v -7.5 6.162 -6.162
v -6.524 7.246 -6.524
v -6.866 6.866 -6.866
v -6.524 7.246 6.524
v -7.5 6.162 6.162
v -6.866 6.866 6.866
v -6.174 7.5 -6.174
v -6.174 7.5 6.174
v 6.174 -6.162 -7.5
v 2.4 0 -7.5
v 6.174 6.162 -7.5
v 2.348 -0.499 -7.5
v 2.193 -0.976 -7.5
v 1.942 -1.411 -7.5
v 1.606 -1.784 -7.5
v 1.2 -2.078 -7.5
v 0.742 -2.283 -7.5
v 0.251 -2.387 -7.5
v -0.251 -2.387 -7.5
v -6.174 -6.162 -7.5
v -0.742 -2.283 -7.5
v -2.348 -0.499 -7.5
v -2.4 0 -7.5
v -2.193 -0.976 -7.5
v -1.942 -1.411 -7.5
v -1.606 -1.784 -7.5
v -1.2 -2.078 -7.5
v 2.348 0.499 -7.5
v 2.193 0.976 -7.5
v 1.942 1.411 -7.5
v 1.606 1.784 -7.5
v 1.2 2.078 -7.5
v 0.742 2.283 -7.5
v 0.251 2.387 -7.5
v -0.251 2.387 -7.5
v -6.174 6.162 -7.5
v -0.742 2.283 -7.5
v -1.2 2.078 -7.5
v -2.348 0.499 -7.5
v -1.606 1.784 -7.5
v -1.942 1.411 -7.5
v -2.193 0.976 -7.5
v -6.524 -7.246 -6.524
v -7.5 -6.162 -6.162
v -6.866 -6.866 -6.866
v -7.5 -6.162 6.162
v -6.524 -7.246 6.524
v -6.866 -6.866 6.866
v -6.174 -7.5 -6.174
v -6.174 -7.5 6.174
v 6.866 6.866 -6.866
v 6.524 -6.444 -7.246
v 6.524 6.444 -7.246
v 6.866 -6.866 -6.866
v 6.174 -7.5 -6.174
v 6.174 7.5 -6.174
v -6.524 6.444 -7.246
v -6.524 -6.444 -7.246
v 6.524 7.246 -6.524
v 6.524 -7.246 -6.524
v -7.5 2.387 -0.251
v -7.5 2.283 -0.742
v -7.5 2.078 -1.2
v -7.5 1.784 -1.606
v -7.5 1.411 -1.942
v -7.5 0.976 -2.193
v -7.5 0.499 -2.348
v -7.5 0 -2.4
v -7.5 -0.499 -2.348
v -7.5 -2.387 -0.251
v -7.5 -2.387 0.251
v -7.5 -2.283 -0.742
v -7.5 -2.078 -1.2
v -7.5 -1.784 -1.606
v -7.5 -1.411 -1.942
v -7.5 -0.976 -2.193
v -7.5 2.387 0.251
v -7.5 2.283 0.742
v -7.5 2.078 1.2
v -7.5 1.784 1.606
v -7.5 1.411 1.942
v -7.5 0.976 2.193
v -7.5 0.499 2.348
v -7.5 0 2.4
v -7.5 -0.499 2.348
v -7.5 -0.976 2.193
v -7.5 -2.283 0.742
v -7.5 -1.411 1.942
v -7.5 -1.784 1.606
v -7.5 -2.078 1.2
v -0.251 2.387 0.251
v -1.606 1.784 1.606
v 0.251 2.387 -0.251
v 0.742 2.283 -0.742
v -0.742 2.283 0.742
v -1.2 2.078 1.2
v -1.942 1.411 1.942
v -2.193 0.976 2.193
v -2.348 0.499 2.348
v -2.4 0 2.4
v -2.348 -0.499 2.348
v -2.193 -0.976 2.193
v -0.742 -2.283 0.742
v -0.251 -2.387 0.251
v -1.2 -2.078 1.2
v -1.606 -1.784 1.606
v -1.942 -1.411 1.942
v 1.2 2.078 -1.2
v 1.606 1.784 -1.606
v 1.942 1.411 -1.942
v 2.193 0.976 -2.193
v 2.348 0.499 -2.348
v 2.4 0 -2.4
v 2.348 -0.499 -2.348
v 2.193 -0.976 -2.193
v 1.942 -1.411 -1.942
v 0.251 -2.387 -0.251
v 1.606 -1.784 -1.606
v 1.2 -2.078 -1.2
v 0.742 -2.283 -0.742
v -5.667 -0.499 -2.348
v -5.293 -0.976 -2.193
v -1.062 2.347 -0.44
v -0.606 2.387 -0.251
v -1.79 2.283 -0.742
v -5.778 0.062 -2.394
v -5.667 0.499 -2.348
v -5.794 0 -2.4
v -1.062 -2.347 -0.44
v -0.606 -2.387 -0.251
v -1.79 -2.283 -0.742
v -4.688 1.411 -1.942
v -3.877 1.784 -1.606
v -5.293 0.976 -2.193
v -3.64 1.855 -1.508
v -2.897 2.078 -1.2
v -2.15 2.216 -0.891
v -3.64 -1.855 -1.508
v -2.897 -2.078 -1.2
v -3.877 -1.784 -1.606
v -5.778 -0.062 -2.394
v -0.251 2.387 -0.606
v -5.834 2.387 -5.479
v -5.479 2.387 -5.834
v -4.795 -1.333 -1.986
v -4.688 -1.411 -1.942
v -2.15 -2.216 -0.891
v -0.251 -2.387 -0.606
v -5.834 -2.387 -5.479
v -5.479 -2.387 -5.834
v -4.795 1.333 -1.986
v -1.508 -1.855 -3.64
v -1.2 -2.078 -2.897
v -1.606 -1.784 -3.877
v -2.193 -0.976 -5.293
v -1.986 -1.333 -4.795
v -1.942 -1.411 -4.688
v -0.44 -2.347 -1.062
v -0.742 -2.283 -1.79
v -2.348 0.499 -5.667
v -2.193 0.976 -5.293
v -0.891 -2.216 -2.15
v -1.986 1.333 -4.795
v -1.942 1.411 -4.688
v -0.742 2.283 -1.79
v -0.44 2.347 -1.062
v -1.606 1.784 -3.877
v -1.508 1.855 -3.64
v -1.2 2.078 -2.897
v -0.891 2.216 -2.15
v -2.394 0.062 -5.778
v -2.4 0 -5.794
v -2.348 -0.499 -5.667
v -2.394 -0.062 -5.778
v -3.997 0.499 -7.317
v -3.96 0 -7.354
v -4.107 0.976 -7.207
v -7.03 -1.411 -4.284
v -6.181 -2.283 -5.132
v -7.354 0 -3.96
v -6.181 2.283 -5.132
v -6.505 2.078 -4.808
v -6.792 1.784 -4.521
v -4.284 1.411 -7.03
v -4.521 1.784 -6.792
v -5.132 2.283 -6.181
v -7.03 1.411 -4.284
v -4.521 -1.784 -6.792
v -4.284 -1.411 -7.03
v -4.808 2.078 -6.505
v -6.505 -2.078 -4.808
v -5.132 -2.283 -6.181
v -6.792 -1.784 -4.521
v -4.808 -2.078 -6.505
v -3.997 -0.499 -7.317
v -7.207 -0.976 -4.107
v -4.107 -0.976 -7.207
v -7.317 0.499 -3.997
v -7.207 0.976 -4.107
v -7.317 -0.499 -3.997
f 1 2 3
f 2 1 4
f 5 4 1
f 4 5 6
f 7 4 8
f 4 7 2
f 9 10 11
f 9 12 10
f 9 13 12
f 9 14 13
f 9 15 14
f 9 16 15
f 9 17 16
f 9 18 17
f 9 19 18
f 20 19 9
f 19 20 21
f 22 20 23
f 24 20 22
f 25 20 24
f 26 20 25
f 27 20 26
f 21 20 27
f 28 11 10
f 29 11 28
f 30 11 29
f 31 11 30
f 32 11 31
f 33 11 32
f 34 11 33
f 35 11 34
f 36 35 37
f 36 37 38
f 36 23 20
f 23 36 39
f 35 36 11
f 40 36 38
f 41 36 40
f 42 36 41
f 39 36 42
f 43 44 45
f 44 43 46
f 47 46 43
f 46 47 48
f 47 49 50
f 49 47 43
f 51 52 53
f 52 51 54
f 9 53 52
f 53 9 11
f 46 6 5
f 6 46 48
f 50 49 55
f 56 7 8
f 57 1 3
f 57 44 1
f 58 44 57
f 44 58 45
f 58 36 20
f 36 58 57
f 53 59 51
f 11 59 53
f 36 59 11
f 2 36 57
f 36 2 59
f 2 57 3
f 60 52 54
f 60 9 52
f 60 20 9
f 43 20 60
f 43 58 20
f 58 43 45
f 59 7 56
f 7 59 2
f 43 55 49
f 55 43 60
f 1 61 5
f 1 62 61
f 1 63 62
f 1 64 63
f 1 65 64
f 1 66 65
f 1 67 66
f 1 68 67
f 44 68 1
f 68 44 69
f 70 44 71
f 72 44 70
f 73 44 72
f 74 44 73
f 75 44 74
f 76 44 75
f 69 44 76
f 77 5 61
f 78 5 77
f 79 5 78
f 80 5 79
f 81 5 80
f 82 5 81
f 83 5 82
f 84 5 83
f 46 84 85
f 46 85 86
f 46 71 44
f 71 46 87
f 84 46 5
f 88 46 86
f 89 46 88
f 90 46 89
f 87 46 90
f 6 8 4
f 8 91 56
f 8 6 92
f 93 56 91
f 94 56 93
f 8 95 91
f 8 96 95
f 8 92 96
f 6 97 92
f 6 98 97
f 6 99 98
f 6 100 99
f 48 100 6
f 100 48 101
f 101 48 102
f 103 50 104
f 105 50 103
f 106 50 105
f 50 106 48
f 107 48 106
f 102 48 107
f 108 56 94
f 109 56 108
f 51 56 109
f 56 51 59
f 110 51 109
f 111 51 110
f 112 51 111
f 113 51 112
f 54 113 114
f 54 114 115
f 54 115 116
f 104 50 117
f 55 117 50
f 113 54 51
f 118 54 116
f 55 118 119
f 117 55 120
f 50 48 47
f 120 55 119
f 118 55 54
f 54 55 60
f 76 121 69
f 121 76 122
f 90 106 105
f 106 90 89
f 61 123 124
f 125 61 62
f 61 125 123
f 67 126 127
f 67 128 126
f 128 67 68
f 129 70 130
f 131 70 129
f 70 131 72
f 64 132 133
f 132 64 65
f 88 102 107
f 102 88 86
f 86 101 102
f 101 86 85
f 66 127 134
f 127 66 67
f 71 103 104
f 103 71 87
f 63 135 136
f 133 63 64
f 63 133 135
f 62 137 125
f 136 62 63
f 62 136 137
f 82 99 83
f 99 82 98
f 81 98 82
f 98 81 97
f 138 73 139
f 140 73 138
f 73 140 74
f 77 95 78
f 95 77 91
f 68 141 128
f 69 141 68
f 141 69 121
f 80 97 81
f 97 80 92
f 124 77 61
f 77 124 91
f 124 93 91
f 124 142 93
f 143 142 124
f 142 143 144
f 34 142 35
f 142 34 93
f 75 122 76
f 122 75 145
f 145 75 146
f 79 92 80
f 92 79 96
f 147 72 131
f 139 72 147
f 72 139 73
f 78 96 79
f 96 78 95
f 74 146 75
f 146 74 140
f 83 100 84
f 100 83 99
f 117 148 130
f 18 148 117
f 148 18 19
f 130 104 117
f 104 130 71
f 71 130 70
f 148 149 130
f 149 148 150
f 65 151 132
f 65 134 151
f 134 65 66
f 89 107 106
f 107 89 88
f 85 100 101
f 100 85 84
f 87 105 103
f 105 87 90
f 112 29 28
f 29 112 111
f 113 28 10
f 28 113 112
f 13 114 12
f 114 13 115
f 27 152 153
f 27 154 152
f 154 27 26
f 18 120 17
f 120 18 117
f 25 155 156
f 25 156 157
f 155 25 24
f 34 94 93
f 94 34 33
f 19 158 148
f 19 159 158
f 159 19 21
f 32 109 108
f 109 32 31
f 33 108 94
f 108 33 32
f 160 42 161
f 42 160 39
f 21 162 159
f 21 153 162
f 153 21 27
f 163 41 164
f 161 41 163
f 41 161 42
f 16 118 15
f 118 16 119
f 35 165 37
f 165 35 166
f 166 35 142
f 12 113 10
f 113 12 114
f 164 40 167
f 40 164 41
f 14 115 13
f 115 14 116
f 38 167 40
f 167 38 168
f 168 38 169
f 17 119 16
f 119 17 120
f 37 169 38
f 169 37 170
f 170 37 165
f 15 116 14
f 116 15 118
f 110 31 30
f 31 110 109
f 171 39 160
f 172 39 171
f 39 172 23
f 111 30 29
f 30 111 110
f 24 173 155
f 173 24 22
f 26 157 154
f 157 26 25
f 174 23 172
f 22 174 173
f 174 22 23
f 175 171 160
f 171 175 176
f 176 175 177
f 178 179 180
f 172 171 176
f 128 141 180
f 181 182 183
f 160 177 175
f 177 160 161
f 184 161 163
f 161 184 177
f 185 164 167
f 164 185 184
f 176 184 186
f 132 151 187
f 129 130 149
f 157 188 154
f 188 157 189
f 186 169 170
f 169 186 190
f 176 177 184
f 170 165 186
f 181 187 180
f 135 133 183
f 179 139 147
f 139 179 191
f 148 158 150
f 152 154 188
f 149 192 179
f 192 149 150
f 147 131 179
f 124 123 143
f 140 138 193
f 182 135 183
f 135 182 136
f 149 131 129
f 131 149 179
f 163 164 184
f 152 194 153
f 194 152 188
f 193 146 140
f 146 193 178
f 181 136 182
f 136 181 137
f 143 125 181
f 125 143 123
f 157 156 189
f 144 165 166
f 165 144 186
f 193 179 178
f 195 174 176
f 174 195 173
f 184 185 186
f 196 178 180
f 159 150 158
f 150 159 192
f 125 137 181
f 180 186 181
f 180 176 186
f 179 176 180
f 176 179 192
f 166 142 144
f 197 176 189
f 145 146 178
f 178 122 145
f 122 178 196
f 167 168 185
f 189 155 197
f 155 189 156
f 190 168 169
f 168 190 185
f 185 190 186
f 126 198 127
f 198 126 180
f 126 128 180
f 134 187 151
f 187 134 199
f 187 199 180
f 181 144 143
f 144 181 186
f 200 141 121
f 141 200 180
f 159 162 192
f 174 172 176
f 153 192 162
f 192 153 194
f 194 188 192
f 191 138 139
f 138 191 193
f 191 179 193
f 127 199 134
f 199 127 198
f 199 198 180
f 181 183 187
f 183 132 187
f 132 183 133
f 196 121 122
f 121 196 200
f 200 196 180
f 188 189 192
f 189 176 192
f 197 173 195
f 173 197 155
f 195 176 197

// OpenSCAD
// file: base file.scad
$fn =30;
base =15; // needs to be 3 larger, used to be 5
module peghole(){
    color("Blue")cylinder (18, 2.4, 2.4, true);
}
// the peg hole template, a change in size here changes hole everywhere
//peg hole enlarged, used to be 6, .8, .8)

module peg(){
    cylinder (6, 2.4, 2.4);
}

module edge(){
cylinder (base, 9.75, 9.75, true);
}
// a cylinder for making block
//enlarged, used to be base, 3.25,3.25


module block(){
    intersection(){
edge();
rotate([90,0,0]) edge();
rotate([0, 90, 0]) edge();
}
}
// create the base cube without the holes
//block();

module blox(){
difference(){ 
block();
   peghole();
rotate ([90, 0, 0]) peghole();
rotate ([0, 90, 0]) peghole();
}
}
//blox();
//unembeleshed blox cube
// main file
use <base file.scad>;
module corner(){difference(){
    block();
   translate([-9,-9,9])rotate([0,45,0])
cube([24,18
   ,12]) color("Red");
    //enlarged was 8,6,4; moved, was -3,-3,-3
 rotate([0,90,0])
   translate([0,0,-4]) peghole();
translate([0,0,-4]) peghole();   
rotate([0,45,0]) translate([0,0,1])peghole();   
}
}
    
//anled blox piece
corner();
